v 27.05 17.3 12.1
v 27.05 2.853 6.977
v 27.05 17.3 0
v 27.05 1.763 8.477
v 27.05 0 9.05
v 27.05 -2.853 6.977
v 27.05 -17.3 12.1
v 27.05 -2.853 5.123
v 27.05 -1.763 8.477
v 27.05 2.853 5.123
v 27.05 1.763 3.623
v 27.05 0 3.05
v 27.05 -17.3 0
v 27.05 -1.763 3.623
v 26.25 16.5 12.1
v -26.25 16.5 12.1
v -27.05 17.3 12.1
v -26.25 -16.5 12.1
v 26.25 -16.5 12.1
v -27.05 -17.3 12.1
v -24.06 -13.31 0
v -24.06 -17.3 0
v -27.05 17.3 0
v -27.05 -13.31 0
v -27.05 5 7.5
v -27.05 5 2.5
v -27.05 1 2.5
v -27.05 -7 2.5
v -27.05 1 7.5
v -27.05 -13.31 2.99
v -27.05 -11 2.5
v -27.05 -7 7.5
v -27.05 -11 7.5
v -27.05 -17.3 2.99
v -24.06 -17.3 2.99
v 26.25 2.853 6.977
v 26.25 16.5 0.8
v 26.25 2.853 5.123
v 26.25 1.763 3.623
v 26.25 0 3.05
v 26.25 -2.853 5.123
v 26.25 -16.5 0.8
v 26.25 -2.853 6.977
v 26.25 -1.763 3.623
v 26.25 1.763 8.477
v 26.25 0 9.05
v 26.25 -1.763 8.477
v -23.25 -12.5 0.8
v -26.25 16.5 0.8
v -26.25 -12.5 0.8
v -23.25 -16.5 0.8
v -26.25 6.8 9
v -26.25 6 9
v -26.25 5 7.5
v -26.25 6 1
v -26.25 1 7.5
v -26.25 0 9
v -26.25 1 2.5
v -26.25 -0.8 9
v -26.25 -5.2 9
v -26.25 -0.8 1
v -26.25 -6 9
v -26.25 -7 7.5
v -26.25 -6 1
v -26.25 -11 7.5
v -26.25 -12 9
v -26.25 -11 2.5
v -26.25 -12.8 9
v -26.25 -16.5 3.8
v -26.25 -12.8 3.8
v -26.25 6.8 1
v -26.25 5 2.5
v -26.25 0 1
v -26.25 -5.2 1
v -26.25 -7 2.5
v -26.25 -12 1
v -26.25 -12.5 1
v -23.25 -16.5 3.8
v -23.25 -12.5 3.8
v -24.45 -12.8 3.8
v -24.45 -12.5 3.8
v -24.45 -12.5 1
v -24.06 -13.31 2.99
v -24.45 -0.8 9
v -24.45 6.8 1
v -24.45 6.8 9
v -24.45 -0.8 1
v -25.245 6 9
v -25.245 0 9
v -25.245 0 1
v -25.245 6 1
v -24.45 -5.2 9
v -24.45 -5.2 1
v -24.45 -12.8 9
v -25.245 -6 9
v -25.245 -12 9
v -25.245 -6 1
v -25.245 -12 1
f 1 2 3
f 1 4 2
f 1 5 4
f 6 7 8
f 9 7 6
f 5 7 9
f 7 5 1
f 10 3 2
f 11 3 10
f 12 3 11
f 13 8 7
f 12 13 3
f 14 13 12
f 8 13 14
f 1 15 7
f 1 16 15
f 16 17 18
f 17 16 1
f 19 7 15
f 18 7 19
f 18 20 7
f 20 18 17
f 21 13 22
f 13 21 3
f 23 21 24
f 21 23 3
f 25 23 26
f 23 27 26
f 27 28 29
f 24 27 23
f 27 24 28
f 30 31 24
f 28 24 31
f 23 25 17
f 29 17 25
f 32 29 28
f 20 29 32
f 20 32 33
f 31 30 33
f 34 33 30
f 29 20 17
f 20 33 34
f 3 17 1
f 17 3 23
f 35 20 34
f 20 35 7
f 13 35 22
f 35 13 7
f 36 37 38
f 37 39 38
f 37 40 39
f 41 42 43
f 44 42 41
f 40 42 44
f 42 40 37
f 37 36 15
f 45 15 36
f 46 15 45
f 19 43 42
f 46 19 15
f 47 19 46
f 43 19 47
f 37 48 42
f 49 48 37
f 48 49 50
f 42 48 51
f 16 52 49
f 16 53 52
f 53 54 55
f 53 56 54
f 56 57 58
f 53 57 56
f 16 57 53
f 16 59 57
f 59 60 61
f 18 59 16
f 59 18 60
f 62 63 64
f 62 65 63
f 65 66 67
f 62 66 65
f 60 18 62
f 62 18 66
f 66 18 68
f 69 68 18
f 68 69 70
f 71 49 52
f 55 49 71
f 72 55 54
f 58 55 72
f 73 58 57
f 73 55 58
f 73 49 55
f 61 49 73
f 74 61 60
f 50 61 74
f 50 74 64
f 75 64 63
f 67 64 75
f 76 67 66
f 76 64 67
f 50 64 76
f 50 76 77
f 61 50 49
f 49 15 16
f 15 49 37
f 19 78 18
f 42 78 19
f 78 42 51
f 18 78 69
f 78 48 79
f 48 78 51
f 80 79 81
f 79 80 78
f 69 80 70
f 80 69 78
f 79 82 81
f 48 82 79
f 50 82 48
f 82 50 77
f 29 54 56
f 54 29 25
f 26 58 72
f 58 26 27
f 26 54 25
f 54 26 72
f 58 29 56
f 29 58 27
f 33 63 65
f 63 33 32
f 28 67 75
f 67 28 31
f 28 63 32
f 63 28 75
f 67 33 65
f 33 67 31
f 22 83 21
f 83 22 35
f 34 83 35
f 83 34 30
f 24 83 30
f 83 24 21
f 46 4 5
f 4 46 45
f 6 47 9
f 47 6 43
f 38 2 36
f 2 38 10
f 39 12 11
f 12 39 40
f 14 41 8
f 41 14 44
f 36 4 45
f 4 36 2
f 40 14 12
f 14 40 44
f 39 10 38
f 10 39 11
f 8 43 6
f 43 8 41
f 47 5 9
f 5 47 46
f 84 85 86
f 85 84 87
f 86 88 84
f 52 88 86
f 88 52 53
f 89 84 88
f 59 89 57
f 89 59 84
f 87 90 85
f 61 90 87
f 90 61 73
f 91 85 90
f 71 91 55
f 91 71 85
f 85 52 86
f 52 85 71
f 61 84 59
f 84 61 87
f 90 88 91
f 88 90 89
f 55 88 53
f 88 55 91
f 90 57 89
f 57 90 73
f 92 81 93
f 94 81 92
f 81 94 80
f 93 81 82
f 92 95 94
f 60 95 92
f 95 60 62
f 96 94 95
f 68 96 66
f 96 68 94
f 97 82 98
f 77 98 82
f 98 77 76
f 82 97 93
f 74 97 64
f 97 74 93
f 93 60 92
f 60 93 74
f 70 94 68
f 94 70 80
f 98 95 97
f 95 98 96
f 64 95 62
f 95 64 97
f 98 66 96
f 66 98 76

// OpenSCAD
bissl = 1 / 100;
part = "box"; //[box,cover,NOSTL_assembly]
height = 12.9;
width = 35.4;
length = 54.9;
wall = 0.8;
contact = 1.0;
wiggle_room = 0.4;
h = height - 2 * wiggle_room;
w = width - 2 * wiggle_room;
l = length - 2 * wiggle_room;

module holder() {
  difference() {
    translate([ (contact + wall) / 2, 0, 0 ])
        cube([ contact + wall, 6 + 2 * wall, 8 ], center = true);
    translate([ contact / 2, 0, 0 ])
        cube([ contact + bissl, 6, 9 ], center = true);
  }
}

module battery() {
  difference() {
    union() {
      difference() {
        translate([ -l / 2, -w / 2, 0 ]) cube([ l, w, h ]);
        translate([ wall - l / 2, wall - w / 2, wall ])
            cube([ l - 2 * wall, w - 2 * wall, h ]);
      }
      translate([ -l / 2, -w / 2, 0 ]) cube([ 3 + wall, 4 + wall, 3 + wall ]);
    }
    translate([ -l / 2 - bissl, -w / 2 - bissl, -bissl ]) cube([ 3, 4, 3 ]);
    for (tr = [
           [ -l / 2 + wall / 2, 3, 5 ],
           //[-l/2+wall/2,-3,5],
           [ -l / 2 + wall / 2, -9, 5 ]
         ])
      translate(tr) cube([ wall + 2 * bissl, 4, 5 ], center = true);
    translate([ l / 2 - wall / 2, 0, h / 2 ]) rotate([ 0, 90, 0 ])
        cylinder(d = 6, h = wall + bissl, center = true);
  }
  for (tr = [ [ -l / 2 + wall, 3, 5 ], [ -l / 2 + wall, -9, 5 ] ])
    translate(tr) holder();
}
module cap() {
  cube([ l, w, wall ], center = true);
  translate([ 0, 0, wall ])
      cube([ l - wall - wiggle_room * 2, w - wall - wiggle_room * 2, wall ],
           center = true);
}
if (part == "assembly") {
  battery();
  translate([ 0, 0, h + 5 ]) rotate([ 180, 0, 0 ]) cap();
}
if (part == "box")
  battery();
if (part == "cover")
  cap();
